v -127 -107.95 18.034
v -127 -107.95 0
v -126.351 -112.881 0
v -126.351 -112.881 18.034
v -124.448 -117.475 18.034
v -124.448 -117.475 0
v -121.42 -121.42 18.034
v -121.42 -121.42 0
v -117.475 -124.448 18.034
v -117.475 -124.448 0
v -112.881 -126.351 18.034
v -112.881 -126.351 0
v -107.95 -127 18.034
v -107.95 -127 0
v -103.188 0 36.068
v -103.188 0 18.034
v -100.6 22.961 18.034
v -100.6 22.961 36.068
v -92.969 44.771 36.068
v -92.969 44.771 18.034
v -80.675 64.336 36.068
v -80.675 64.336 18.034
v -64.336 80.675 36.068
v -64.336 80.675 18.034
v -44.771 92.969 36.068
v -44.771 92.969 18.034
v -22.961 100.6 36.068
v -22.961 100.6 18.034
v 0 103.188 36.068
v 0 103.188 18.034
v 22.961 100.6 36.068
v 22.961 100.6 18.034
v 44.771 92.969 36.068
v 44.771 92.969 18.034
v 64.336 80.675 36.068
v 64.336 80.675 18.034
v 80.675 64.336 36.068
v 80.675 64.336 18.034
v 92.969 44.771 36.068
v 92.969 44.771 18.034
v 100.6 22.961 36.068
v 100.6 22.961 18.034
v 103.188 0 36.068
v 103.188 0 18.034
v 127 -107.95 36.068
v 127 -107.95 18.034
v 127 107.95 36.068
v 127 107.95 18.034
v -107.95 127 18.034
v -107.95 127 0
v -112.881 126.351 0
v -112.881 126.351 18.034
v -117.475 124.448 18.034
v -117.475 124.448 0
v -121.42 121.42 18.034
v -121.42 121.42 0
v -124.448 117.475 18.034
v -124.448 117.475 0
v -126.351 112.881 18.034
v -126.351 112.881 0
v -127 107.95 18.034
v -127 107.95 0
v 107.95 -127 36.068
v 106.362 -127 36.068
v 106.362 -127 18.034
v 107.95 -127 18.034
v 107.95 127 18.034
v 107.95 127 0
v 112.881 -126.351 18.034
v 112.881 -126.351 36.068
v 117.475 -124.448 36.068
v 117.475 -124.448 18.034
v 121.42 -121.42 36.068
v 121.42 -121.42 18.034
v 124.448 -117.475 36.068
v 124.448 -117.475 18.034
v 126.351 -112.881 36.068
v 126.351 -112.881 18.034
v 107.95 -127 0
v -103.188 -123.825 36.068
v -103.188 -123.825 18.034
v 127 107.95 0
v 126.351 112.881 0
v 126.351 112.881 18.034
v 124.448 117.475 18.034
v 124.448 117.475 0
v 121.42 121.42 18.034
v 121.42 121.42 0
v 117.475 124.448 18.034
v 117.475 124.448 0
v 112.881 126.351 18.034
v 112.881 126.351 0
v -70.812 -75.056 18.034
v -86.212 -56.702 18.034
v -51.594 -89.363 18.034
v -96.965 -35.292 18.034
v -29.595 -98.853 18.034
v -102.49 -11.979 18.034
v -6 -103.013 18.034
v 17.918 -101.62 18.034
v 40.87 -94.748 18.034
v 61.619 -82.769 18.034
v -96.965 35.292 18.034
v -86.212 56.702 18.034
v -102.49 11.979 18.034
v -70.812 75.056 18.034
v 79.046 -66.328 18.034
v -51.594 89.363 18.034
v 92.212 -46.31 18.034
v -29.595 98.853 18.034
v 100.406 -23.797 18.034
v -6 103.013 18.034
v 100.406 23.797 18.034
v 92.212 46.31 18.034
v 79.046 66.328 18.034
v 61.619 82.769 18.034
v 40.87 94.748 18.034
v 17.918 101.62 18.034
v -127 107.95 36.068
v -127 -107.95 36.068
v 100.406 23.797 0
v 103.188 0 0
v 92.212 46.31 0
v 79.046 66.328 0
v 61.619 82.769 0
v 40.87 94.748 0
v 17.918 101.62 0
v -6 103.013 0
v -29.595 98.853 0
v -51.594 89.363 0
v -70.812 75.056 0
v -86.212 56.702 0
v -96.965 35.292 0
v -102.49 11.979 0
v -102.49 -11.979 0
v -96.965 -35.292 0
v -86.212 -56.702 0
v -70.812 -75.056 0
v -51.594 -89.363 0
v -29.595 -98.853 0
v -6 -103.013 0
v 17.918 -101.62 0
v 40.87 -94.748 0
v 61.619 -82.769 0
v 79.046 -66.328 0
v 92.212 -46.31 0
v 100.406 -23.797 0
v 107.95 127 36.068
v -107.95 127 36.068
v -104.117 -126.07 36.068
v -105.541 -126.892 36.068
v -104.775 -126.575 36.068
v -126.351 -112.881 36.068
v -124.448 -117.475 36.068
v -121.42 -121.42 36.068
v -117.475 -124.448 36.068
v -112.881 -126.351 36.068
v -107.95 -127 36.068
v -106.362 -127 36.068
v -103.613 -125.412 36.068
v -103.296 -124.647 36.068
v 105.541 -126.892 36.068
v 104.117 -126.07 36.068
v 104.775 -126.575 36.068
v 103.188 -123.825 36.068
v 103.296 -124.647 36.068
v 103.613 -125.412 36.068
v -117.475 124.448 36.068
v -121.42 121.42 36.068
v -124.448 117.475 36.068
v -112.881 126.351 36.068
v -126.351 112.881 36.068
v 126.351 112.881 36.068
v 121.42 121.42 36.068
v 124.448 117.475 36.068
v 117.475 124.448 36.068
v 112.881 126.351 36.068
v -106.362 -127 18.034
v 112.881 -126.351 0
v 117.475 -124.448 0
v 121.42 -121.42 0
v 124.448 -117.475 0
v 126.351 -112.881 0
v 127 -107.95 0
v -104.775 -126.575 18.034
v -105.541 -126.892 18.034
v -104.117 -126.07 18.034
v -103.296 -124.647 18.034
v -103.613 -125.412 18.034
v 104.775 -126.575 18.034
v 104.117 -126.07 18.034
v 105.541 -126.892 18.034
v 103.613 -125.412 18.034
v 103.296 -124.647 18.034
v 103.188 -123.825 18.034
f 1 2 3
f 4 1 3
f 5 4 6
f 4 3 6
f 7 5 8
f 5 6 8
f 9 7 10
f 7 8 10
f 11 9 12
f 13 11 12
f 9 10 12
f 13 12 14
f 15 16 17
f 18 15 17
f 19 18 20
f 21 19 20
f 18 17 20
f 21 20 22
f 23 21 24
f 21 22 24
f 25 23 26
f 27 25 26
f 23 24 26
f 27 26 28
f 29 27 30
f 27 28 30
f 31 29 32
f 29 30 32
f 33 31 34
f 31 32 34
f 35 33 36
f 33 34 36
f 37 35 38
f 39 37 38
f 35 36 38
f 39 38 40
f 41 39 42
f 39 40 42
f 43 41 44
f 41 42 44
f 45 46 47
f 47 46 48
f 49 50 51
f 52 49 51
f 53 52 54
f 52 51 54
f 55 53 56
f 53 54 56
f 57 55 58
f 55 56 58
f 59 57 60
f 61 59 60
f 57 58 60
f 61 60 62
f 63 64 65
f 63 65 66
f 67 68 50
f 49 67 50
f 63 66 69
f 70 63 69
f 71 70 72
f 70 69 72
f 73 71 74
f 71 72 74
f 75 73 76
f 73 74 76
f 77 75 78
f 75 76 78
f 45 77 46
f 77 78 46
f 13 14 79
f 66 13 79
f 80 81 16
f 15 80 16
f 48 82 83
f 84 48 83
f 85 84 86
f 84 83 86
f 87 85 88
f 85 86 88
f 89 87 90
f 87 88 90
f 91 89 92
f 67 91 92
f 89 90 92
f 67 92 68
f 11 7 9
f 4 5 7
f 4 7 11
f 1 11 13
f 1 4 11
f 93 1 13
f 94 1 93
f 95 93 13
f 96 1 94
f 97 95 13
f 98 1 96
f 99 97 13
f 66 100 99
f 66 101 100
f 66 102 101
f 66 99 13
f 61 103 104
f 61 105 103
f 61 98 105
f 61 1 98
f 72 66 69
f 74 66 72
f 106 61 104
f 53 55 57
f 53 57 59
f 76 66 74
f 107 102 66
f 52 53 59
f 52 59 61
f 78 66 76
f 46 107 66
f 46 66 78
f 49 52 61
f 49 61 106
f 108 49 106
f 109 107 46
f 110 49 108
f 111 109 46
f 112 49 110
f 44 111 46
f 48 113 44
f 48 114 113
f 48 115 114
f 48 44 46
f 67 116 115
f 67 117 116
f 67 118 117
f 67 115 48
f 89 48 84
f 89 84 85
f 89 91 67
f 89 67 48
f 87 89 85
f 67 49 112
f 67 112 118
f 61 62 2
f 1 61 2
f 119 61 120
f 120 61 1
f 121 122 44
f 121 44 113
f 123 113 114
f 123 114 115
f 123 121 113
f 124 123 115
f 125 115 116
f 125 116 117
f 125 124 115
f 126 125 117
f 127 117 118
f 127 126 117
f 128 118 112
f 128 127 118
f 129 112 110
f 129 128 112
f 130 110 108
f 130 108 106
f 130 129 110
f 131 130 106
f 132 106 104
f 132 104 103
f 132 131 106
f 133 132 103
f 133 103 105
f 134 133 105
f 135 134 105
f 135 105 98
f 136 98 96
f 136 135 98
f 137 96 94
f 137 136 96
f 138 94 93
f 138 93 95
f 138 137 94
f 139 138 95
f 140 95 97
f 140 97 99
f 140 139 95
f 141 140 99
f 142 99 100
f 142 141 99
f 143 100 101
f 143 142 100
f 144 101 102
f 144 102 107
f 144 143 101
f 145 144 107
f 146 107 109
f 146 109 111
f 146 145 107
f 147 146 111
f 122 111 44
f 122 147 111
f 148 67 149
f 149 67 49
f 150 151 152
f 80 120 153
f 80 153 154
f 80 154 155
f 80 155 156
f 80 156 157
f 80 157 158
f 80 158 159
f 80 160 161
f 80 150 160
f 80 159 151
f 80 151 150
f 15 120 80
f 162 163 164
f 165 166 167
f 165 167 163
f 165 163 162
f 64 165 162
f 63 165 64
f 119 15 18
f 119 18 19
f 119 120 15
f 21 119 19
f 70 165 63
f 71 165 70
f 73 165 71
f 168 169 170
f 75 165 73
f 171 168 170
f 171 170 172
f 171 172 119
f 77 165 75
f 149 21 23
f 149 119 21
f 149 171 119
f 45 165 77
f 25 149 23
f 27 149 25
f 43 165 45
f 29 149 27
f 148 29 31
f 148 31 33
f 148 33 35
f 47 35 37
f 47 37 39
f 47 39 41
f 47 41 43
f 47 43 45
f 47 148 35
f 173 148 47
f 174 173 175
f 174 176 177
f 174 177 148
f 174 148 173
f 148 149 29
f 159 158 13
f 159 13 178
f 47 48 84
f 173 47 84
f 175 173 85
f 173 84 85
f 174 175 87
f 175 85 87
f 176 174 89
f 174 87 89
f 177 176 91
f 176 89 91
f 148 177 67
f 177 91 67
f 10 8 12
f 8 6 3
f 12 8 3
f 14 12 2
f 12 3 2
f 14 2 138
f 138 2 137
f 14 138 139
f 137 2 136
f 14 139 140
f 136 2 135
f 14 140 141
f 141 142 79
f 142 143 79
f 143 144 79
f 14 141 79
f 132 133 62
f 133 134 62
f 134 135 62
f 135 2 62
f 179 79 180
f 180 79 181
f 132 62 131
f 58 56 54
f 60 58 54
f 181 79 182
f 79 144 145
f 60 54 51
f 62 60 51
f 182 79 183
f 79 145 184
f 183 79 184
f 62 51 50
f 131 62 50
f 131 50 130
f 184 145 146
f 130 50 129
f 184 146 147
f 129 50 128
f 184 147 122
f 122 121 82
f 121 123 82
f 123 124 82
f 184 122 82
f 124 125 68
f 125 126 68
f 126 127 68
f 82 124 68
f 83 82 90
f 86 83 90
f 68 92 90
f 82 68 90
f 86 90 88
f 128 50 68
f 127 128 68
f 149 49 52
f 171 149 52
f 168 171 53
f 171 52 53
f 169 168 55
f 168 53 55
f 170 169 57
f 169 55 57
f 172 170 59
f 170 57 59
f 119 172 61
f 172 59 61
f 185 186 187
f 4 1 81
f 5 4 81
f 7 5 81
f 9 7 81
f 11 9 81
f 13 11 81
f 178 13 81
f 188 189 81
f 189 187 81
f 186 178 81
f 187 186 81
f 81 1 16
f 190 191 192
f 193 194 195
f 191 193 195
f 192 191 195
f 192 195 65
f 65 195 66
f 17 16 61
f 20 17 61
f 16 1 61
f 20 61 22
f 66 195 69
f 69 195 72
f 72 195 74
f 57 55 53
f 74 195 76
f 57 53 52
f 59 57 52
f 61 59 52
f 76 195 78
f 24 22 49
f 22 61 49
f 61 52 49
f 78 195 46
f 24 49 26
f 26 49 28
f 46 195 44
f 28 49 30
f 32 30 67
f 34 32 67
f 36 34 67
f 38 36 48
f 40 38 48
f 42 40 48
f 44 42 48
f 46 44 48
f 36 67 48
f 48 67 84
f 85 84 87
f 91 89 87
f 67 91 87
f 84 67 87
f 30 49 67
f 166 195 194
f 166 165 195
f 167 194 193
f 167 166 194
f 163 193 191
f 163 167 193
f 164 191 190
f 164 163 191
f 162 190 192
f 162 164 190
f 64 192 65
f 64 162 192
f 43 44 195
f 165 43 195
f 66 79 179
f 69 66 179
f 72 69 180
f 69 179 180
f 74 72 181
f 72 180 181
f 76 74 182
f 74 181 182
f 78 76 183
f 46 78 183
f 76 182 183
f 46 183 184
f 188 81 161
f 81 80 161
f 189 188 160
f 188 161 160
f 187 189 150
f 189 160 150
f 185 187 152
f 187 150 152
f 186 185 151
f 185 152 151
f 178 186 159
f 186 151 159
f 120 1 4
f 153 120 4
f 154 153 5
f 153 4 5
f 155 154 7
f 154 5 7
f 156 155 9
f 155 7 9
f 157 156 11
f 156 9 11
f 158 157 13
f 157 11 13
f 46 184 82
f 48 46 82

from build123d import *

# Parameters (mm, degrees)
F0_R     = 103.1875
F1_DEPTH = 18.034
F3_DEPTH = 18.034
F4_R     = 3.175


with BuildPart() as f1:
    # F0 (on Top) → F1 (new body)
    with BuildSketch(Plane.XY):
        with BuildLine():
            Line((-107.95, -127), (107.95, -127))
            ThreePointArc((107.95, -127), (121.4203841816, -121.4203841816), (127, -107.95))
            Line((127, -107.95), (127, 107.95))
            ThreePointArc((127, 107.95), (121.4203841816, 121.4203841816), (107.95, 127))
            Line((107.95, 127), (-107.95, 127))
            ThreePointArc((-107.95, 127), (-121.4203841816, 121.4203841816), (-127, 107.95))
            Line((-127, 107.95), (-127, -107.95))
            ThreePointArc((-127, -107.95), (-121.4203841816, -121.4203841816), (-107.95, -127))
        make_face()
        Circle(F0_R, mode=Mode.SUBTRACT)
    extrude(amount=F1_DEPTH)


with BuildPart() as f3:
    # F2 (on face) → F3 (new body)
    with BuildSketch(Plane.XY.offset(18.034)):
        with BuildLine():
            Line((-103.1875, -127), (-103.1875, 0))
            ThreePointArc((-103.1875, 0), (0, 103.1875), (103.1875, 0))
            Line((103.1875, 0), (103.1875, -127))
            Line((103.1875, -127), (107.95, -127))
            ThreePointArc((107.95, -127), (121.4203841816, -121.4203841816), (127, -107.95))
            Line((127, -107.95), (127, 107.95))
            ThreePointArc((127, 107.95), (121.4203841816, 121.4203841816), (107.95, 127))
            Line((107.95, 127), (-107.95, 127))
            ThreePointArc((-107.95, 127), (-121.4203841816, 121.4203841816), (-127, 107.95))
            Line((-127, 107.95), (-127, -107.95))
            ThreePointArc((-127, -107.95), (-121.4203841816, -121.4203841816), (-107.95, -127))
            Line((-107.95, -127), (-103.1875, -127))
        make_face()
    extrude(amount=F3_DEPTH)

    # F4
    f4_edges = [f3.edges().sort_by_distance(p)[0] for p in [
        (-103.1875, -127, 27.051),
        (103.1875, -127, 27.051),
    ]]
    fillet(f4_edges, radius=F4_R)


solid = Compound([f1.part, f3.part])
